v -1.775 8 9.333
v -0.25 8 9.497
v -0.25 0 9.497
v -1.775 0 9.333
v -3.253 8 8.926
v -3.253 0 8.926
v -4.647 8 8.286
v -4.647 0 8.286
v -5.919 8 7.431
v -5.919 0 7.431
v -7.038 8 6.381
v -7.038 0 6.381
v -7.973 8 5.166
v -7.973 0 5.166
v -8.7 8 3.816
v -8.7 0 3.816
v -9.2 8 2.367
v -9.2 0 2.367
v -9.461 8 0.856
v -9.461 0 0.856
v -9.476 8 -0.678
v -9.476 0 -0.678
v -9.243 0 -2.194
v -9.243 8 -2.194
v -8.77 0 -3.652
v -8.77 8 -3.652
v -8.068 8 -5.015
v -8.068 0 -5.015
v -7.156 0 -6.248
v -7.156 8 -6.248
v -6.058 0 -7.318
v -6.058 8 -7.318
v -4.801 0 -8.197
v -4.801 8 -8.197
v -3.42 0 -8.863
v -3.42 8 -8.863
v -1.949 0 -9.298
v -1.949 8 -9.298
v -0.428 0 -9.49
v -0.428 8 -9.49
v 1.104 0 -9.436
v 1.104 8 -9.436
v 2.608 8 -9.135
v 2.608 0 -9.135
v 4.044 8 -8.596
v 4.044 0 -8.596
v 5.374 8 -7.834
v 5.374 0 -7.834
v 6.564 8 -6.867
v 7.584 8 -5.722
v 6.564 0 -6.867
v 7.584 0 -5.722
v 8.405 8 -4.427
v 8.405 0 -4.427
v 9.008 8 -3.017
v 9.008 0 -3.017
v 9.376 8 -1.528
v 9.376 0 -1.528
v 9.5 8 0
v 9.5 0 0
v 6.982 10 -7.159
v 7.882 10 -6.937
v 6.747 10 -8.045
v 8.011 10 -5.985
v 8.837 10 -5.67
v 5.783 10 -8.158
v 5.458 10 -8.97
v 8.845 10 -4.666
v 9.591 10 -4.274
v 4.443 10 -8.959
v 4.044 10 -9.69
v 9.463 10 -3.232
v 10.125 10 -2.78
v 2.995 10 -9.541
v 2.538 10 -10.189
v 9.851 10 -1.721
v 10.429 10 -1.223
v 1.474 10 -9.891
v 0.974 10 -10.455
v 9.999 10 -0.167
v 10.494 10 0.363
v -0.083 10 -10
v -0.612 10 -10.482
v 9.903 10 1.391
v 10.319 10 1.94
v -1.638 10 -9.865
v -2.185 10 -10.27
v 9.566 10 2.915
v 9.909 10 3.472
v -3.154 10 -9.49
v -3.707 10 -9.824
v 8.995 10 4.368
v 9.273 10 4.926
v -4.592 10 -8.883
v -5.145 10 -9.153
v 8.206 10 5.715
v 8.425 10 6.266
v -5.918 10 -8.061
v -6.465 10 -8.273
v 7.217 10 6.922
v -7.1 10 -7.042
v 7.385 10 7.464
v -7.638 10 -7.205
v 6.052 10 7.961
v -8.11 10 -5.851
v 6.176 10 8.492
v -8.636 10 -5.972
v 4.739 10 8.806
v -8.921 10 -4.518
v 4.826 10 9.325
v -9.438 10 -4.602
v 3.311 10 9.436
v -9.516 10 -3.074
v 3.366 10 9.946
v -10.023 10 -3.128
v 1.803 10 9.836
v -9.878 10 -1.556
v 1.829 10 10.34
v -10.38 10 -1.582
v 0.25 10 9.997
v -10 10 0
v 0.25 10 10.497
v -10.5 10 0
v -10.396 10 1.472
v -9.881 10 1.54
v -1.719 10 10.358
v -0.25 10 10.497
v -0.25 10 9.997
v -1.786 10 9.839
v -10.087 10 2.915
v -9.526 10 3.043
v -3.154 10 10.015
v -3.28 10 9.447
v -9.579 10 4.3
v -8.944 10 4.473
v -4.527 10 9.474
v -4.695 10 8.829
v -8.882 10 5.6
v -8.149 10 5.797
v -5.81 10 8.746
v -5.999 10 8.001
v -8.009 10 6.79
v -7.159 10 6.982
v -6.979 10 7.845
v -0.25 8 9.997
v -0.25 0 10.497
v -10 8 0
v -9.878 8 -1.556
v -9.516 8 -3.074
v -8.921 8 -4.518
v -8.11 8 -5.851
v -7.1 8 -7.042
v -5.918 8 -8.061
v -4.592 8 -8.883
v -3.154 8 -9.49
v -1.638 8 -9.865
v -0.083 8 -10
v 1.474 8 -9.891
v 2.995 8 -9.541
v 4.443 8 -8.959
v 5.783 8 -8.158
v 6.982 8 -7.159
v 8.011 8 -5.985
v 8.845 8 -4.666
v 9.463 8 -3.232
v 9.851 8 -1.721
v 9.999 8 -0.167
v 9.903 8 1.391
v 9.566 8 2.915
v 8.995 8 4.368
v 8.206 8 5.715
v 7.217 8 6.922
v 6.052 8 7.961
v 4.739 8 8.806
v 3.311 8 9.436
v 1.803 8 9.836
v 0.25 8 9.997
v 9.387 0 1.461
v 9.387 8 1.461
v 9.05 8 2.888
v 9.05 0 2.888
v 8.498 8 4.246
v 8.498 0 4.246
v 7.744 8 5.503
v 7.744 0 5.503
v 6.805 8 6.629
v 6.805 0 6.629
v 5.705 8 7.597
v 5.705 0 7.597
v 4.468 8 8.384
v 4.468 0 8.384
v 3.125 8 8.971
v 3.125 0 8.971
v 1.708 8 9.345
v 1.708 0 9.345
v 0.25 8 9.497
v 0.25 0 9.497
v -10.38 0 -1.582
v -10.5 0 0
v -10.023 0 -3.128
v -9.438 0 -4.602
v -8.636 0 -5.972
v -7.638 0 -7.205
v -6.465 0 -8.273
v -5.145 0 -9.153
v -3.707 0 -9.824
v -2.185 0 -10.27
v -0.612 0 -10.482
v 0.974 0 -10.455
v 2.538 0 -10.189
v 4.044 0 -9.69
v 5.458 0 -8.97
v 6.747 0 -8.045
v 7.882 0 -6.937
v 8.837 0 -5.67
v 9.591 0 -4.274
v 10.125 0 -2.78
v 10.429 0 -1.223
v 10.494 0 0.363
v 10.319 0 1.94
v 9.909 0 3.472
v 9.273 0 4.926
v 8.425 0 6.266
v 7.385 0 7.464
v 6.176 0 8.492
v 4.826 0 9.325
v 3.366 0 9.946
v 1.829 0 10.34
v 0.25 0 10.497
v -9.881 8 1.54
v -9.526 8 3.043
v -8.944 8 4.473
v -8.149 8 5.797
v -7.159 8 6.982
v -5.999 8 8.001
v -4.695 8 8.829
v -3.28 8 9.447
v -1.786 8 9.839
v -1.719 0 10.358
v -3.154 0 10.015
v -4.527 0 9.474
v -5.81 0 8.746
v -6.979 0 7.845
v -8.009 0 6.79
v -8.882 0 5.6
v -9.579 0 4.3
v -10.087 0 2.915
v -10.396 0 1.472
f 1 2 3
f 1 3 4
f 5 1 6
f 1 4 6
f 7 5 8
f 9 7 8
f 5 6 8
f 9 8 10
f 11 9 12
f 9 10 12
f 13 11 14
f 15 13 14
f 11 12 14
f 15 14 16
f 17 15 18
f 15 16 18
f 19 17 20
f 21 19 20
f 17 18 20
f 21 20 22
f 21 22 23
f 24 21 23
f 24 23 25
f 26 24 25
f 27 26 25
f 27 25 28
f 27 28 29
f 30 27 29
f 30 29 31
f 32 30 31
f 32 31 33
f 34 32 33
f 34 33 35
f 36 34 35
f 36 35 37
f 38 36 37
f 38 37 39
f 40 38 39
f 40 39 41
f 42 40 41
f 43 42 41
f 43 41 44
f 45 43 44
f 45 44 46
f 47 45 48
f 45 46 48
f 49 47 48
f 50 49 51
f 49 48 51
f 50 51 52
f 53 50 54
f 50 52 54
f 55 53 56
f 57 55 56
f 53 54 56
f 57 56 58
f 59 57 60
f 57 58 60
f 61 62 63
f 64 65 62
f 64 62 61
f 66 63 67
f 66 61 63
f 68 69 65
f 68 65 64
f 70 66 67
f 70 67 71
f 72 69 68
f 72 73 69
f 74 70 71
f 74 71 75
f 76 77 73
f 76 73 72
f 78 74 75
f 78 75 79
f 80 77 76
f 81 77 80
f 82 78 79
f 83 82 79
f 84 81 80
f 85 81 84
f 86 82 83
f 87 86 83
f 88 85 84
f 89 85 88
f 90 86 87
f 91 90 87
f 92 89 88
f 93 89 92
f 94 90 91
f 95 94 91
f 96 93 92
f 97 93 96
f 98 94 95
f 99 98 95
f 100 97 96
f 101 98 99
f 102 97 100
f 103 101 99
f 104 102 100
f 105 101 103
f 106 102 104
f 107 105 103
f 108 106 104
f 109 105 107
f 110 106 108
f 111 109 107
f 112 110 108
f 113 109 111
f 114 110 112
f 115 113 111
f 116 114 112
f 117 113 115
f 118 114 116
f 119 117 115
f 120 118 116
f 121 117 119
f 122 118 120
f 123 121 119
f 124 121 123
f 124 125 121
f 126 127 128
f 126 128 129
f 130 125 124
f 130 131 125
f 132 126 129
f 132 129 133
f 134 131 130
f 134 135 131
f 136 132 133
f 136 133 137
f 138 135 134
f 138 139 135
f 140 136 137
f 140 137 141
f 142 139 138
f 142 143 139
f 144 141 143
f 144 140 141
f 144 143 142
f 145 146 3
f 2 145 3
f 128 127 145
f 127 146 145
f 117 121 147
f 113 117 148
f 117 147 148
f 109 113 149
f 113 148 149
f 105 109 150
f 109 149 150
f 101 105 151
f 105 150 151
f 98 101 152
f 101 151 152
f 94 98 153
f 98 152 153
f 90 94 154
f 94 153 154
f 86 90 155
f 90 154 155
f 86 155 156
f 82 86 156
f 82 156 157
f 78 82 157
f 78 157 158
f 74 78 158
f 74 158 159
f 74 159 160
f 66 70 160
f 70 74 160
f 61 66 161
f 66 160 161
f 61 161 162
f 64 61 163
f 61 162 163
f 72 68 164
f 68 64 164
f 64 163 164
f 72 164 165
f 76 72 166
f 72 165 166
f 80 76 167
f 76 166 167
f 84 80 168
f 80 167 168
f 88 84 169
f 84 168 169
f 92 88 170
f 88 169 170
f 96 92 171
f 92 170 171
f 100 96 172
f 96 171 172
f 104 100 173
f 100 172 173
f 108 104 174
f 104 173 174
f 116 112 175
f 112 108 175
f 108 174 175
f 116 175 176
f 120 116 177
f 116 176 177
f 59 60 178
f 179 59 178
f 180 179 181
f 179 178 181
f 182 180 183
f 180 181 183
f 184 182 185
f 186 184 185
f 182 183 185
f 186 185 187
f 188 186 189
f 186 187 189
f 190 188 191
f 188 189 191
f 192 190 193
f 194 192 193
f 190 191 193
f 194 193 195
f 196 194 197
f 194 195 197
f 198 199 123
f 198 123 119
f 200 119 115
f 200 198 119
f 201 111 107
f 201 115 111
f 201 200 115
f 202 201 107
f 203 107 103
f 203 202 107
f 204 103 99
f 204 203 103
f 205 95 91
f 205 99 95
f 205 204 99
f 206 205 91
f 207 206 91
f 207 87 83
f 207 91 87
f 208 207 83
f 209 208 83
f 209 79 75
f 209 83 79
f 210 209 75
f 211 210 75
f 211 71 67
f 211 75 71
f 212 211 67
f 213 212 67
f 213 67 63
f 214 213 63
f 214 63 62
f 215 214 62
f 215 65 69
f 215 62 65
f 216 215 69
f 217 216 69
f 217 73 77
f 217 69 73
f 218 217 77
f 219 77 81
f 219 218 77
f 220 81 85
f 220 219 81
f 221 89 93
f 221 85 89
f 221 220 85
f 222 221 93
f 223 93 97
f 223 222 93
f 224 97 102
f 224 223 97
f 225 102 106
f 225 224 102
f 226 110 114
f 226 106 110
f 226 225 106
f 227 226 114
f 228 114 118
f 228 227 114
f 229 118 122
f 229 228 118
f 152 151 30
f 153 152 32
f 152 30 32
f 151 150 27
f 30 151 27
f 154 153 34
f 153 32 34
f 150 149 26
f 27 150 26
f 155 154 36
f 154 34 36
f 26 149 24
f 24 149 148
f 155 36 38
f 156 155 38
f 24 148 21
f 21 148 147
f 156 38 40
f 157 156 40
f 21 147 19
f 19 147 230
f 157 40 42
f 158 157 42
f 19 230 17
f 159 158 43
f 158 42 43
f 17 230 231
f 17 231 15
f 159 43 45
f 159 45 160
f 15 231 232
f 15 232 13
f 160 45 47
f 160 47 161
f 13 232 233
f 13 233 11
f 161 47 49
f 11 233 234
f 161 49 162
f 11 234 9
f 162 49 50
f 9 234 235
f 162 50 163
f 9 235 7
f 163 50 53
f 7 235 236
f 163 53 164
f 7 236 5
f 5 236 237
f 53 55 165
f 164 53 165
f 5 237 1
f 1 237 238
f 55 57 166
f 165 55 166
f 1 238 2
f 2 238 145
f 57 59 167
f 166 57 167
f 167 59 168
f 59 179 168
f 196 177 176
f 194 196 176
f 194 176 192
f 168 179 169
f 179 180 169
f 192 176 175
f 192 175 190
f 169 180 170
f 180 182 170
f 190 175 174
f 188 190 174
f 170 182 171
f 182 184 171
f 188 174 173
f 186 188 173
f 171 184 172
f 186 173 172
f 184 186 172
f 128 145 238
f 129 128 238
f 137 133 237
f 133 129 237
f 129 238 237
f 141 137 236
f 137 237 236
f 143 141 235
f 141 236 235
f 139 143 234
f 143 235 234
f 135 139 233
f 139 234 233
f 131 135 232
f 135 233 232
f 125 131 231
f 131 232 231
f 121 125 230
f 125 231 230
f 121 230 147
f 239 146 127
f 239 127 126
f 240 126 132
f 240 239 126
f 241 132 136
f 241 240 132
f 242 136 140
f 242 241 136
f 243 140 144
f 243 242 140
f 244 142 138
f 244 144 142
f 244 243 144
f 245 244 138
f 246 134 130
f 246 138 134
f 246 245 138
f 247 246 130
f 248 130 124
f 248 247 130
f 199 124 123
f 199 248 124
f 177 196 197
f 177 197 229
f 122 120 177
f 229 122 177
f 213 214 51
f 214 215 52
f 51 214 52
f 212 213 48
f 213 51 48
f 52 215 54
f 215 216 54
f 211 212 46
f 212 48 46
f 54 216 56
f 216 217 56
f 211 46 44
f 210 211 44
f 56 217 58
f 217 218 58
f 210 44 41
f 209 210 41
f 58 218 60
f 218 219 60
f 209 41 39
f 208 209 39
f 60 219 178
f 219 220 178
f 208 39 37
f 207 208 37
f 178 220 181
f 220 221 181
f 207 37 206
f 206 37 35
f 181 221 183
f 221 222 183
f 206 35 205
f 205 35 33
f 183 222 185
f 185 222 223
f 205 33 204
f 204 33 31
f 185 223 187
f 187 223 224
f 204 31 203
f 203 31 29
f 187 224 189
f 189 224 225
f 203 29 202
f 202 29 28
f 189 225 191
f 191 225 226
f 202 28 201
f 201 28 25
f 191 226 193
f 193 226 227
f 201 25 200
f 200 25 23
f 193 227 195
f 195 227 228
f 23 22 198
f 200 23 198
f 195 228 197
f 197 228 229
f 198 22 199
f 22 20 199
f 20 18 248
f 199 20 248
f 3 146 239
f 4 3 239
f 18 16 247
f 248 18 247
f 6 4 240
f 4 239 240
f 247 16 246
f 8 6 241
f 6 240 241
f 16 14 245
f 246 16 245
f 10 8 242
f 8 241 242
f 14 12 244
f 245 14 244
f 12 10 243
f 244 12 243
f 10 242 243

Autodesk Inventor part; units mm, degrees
ref_plane "YZ Plane" through (0, 0, 0) normal (1, 0, 0) x (0, 1, 0)
ref_plane "XZ Plane" through (0, 0, 0) normal (0, 1, 0) x (-1, 0, 0)
ref_plane "XY Plane" through (0, 0, 0) normal (0, 0, 1) x (1, 0, 0)
sketch "スケッチ1" plane through (0, 0, 0) normal (0, 1, 0) x (-1, 0, 0)
  circle A0 centre (0, 0) radius 10
  circle A1 centre (0, 0) radius 10.5
  dimension "d0" = 20
  dimension "d1" = 21
extrude "押し出し1" add sketch "スケッチ1" along normal blind 10
sketch "スケッチ2" plane through (0, 0, 0) normal (0, -1, 0) x (1, 0, 0)
  circle A0 centre (0, 0) radius 9.5
  circle A1 centre (0, 0) radius 10 projected
  dimension "d4" = 19
extrude "押し出し2" add sketch "スケッチ2" against normal blind 8
sketch "スケッチ3" plane through (0, 10, 0) normal (0, 1, 0) x (1, 0, 0)
  line L0 (0.25, -6.9967) -> (0.25, -11.9967)
  line L1 (0.25, -11.9967) -> (-0.25, -11.9967)
  line L2 (-0.25, -11.9967) -> (-0.25, -6.9967)
  line L3 (-0.25, -6.9967) -> (0, -6.9967)
  line L4 (0, -6.9967) -> (0.25, -6.9967)
  circle A0 centre (0, 0) radius 9.5 projected
  point P0 (0.25, -9.4967)
  dimension "d7" = 0.5
  dimension "d10" = 5
extrude "押し出し3" cut sketch "スケッチ3" against normal through all contours L0 A0 L2 L3 L4 | L0 L1 L2 A0 picked at (0.1111, -7.831)
properties part number "zig64"
